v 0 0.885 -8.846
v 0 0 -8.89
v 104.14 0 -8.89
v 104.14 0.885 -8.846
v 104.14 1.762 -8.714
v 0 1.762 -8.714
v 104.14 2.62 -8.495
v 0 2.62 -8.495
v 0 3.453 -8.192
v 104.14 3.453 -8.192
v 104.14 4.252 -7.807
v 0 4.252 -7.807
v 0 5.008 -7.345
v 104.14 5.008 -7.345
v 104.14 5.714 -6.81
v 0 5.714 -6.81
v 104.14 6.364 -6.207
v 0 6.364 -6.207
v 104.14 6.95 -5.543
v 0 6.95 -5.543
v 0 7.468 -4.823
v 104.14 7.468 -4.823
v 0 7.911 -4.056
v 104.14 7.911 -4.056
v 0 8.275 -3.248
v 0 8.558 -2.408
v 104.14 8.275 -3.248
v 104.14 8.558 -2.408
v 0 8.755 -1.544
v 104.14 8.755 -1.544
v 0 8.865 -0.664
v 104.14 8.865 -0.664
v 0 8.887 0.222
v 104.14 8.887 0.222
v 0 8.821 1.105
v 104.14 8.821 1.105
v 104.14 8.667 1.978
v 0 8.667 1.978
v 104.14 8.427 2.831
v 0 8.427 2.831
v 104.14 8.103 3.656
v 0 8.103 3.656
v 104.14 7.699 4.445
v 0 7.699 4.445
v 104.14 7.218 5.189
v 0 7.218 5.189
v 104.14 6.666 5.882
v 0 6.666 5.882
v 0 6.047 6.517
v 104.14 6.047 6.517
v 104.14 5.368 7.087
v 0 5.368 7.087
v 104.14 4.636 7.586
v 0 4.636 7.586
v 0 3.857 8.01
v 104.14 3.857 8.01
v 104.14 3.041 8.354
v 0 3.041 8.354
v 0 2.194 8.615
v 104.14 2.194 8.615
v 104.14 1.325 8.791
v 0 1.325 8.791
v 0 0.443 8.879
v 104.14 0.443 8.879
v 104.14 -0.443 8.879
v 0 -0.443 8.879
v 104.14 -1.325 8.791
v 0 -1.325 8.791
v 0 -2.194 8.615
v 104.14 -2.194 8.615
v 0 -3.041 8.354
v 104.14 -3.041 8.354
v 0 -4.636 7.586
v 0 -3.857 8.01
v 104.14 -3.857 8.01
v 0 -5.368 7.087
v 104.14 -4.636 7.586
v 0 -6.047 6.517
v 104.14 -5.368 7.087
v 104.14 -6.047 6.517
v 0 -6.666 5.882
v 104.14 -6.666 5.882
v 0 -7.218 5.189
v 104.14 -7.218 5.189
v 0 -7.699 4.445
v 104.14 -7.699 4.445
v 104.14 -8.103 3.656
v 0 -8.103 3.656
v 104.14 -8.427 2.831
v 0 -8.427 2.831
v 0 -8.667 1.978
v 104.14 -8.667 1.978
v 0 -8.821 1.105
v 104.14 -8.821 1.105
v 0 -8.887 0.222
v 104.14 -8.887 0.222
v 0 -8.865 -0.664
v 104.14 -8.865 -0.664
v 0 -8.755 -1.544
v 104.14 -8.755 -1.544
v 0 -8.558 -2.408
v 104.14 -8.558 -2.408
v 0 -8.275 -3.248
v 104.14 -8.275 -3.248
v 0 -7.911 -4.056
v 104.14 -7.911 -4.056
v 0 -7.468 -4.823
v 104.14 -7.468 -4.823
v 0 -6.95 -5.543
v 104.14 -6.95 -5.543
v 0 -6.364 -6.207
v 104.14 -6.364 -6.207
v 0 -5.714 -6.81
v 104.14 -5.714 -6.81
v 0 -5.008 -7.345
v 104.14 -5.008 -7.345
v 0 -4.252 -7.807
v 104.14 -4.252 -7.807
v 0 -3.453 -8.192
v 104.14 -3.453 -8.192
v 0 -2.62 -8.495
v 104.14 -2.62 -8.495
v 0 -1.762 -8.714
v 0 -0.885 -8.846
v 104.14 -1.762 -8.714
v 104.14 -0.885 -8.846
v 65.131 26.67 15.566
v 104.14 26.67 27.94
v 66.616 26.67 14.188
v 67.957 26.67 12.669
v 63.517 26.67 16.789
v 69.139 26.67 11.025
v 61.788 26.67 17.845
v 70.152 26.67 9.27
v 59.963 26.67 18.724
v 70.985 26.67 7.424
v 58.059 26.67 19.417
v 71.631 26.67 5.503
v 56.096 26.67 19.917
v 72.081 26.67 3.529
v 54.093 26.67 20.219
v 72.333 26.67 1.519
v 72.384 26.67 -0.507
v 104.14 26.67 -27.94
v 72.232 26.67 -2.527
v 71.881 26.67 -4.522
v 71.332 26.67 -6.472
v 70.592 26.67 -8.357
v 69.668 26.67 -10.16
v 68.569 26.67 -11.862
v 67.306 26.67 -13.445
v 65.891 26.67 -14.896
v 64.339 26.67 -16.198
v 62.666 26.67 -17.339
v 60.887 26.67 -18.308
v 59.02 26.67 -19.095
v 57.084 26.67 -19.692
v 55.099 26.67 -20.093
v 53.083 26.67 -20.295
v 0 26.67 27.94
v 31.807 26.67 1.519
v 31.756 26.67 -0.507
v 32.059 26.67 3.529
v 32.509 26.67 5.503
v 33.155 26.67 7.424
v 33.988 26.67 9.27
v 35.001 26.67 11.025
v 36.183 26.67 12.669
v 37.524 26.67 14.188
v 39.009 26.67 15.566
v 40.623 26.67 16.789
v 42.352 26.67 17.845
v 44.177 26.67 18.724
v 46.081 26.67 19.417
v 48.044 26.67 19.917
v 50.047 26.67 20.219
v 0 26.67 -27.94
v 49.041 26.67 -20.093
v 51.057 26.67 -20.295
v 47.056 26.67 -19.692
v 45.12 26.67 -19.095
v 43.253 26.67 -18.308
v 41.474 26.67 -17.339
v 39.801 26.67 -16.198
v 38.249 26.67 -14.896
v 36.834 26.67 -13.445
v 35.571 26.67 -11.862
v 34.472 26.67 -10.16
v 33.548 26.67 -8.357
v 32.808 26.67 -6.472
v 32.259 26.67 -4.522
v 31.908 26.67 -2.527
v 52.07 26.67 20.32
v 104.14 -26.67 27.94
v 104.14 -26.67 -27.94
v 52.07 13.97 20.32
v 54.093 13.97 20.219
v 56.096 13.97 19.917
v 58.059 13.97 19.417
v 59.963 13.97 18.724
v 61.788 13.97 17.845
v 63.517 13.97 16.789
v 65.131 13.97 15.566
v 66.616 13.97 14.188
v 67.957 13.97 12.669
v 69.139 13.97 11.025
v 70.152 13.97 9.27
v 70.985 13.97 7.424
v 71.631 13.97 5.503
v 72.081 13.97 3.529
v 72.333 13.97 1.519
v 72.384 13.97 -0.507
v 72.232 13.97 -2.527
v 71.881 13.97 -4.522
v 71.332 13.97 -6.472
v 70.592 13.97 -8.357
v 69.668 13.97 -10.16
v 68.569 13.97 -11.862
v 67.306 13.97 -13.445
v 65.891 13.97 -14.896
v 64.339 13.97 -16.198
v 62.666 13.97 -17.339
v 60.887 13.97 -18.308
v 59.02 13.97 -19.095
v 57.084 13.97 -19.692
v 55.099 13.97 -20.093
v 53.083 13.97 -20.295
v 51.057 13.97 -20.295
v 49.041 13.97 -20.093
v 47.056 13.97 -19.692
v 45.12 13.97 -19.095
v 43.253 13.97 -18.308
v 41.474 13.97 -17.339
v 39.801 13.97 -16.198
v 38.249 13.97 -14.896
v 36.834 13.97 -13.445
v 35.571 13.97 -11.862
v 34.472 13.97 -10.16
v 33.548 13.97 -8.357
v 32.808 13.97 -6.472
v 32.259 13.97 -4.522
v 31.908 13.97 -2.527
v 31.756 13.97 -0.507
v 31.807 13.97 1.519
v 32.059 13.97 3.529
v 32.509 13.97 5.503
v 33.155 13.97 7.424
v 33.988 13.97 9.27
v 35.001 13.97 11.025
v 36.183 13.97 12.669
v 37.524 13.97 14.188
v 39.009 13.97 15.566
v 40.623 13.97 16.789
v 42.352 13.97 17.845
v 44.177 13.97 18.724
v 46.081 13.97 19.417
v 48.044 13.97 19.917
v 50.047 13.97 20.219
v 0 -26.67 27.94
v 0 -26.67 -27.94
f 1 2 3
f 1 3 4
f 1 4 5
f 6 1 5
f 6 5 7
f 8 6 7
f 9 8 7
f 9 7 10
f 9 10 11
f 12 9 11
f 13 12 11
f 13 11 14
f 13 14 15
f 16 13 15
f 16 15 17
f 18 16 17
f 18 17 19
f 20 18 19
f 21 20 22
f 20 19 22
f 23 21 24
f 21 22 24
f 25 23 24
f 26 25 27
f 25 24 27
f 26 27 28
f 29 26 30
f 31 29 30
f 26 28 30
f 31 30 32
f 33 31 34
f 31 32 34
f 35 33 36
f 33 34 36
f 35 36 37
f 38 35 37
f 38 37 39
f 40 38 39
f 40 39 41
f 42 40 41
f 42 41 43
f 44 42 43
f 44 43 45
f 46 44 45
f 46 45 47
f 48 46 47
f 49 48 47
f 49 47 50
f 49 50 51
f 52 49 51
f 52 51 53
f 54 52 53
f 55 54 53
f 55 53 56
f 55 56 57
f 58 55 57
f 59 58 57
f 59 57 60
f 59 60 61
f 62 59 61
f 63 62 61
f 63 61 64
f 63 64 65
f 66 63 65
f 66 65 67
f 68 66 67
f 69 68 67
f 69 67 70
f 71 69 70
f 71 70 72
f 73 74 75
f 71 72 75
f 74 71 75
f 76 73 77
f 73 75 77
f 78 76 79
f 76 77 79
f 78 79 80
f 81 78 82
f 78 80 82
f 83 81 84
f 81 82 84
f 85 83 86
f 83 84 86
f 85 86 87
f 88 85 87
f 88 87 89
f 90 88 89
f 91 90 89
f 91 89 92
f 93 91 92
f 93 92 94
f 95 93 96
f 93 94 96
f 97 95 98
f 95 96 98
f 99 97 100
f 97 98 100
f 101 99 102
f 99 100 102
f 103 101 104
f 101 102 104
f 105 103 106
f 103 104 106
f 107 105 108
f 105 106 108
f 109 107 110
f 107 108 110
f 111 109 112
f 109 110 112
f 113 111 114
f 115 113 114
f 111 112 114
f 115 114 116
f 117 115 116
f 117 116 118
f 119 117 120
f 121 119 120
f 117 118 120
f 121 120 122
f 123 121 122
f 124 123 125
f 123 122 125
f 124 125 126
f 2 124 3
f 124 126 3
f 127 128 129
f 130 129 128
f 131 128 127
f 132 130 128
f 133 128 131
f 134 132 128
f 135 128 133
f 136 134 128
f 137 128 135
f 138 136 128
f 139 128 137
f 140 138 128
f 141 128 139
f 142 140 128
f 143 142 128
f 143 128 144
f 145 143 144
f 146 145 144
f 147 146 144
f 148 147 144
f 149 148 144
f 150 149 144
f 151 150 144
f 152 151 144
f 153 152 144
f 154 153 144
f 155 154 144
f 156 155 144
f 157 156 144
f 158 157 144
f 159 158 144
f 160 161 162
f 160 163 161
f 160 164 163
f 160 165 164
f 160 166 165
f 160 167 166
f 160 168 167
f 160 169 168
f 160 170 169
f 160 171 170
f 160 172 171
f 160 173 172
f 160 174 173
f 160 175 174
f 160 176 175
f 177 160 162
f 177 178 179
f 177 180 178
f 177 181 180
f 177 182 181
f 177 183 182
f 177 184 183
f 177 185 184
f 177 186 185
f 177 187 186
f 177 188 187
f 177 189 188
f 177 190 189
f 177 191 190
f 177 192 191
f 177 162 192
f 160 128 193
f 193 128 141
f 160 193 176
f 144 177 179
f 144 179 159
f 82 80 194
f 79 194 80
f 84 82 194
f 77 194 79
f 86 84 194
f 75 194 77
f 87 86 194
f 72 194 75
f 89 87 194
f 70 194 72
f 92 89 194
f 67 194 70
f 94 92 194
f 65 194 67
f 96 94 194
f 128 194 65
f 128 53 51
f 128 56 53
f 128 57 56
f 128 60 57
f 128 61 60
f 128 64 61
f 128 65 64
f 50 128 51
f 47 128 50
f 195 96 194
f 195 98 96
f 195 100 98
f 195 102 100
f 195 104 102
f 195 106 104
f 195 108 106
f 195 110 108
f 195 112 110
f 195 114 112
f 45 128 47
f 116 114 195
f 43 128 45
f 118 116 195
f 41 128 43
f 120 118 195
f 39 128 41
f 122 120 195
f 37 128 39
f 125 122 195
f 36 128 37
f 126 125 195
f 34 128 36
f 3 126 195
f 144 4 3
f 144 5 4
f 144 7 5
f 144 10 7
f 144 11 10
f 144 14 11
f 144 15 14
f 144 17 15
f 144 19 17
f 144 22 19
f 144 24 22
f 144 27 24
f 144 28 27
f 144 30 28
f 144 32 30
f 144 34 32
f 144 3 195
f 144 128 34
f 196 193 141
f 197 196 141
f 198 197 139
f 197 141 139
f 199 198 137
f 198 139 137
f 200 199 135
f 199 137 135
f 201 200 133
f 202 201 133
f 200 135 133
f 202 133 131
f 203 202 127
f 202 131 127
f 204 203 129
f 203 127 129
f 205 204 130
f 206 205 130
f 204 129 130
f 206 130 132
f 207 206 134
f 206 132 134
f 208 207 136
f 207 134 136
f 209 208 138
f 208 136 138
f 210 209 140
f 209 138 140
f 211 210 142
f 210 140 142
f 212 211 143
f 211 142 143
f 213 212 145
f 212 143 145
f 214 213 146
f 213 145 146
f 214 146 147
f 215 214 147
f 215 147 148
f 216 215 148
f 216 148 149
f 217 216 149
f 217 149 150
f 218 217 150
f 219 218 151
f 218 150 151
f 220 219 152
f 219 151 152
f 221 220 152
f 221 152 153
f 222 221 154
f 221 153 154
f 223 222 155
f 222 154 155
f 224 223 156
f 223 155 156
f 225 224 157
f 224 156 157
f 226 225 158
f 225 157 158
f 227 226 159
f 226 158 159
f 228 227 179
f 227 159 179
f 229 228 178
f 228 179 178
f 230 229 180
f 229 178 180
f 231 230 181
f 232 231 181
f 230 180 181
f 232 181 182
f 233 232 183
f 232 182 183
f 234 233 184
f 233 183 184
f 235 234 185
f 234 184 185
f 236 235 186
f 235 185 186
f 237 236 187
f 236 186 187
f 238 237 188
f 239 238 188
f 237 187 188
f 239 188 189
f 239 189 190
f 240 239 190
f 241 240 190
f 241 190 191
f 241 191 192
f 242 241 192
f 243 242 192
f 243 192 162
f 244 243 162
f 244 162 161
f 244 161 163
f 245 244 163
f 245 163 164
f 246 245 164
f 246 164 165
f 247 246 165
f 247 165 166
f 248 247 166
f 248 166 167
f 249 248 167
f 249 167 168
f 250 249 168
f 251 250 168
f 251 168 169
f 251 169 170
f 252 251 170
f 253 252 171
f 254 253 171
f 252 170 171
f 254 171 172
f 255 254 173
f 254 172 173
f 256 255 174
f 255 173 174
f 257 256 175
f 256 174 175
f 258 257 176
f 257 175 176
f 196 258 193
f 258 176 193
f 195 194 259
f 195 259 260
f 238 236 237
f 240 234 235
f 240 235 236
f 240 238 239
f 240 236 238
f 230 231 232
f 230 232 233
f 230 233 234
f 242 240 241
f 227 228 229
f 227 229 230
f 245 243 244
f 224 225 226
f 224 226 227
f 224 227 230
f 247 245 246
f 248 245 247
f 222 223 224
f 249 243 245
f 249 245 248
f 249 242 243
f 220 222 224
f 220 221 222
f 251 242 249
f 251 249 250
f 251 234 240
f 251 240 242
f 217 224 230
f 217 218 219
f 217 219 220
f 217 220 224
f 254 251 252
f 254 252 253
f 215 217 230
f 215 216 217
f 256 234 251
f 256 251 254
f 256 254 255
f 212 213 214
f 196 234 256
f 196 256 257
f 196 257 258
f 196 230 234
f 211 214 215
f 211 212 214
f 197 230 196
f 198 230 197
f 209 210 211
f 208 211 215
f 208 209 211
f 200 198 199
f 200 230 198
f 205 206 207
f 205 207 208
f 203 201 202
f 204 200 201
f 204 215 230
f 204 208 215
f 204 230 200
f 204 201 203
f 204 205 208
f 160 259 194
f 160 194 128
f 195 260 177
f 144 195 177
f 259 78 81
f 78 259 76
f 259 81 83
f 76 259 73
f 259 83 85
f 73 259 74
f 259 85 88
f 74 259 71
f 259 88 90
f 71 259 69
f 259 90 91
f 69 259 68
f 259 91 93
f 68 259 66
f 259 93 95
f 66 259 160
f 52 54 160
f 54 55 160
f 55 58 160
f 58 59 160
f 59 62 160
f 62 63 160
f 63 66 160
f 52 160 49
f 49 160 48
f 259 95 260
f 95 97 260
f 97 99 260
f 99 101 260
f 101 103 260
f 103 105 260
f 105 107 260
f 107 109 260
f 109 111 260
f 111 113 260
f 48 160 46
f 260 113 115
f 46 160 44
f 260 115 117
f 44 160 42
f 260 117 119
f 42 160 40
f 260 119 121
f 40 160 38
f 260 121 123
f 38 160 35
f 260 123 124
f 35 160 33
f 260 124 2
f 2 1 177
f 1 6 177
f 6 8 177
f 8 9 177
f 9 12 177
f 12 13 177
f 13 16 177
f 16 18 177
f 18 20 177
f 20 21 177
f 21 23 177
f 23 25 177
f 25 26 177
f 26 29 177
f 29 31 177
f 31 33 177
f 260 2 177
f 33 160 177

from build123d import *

# Parameters (mm, degrees)
SKETCH1_W           = 55.88
SKETCH1_H           = 53.34
BOSS_EXTRUDE1_DEPTH = 104.14
SKETCH2_R           = 8.89
CUT_EXTRUDE1_DEPTH  = 112.072373253
SKETCH3_R           = 20.32
CUT_EXTRUDE2_DEPTH  = 12.7


with BuildPart() as part:
    # Sketch1 → Boss-Extrude1 (new body)
    with BuildSketch(Plane(origin=(0, 0, 0), x_dir=(0, 0, -1), z_dir=(1, 0, 0))):
        Rectangle(SKETCH1_W, SKETCH1_H)
    extrude(amount=BOSS_EXTRUDE1_DEPTH)

    # Sketch2 → Cut-Extrude1 (cut, through all)
    with BuildSketch(Plane(origin=(104.14, 0, 0), x_dir=(0, 0, -1), z_dir=(1, 0, 0))):
        Circle(SKETCH2_R)
    extrude(amount=-CUT_EXTRUDE1_DEPTH, mode=Mode.SUBTRACT)

    # Sketch3 → Cut-Extrude2 (cut)
    with BuildSketch(Plane(origin=(0, 26.67, 0), x_dir=(1, 0, 0), z_dir=(0, 1, 0))):
        with Locations(Location((52.07, 0, 0), (0, 0, 270))):
            Circle(SKETCH3_R)
    extrude(amount=-CUT_EXTRUDE2_DEPTH, mode=Mode.SUBTRACT)


solid = part.part
